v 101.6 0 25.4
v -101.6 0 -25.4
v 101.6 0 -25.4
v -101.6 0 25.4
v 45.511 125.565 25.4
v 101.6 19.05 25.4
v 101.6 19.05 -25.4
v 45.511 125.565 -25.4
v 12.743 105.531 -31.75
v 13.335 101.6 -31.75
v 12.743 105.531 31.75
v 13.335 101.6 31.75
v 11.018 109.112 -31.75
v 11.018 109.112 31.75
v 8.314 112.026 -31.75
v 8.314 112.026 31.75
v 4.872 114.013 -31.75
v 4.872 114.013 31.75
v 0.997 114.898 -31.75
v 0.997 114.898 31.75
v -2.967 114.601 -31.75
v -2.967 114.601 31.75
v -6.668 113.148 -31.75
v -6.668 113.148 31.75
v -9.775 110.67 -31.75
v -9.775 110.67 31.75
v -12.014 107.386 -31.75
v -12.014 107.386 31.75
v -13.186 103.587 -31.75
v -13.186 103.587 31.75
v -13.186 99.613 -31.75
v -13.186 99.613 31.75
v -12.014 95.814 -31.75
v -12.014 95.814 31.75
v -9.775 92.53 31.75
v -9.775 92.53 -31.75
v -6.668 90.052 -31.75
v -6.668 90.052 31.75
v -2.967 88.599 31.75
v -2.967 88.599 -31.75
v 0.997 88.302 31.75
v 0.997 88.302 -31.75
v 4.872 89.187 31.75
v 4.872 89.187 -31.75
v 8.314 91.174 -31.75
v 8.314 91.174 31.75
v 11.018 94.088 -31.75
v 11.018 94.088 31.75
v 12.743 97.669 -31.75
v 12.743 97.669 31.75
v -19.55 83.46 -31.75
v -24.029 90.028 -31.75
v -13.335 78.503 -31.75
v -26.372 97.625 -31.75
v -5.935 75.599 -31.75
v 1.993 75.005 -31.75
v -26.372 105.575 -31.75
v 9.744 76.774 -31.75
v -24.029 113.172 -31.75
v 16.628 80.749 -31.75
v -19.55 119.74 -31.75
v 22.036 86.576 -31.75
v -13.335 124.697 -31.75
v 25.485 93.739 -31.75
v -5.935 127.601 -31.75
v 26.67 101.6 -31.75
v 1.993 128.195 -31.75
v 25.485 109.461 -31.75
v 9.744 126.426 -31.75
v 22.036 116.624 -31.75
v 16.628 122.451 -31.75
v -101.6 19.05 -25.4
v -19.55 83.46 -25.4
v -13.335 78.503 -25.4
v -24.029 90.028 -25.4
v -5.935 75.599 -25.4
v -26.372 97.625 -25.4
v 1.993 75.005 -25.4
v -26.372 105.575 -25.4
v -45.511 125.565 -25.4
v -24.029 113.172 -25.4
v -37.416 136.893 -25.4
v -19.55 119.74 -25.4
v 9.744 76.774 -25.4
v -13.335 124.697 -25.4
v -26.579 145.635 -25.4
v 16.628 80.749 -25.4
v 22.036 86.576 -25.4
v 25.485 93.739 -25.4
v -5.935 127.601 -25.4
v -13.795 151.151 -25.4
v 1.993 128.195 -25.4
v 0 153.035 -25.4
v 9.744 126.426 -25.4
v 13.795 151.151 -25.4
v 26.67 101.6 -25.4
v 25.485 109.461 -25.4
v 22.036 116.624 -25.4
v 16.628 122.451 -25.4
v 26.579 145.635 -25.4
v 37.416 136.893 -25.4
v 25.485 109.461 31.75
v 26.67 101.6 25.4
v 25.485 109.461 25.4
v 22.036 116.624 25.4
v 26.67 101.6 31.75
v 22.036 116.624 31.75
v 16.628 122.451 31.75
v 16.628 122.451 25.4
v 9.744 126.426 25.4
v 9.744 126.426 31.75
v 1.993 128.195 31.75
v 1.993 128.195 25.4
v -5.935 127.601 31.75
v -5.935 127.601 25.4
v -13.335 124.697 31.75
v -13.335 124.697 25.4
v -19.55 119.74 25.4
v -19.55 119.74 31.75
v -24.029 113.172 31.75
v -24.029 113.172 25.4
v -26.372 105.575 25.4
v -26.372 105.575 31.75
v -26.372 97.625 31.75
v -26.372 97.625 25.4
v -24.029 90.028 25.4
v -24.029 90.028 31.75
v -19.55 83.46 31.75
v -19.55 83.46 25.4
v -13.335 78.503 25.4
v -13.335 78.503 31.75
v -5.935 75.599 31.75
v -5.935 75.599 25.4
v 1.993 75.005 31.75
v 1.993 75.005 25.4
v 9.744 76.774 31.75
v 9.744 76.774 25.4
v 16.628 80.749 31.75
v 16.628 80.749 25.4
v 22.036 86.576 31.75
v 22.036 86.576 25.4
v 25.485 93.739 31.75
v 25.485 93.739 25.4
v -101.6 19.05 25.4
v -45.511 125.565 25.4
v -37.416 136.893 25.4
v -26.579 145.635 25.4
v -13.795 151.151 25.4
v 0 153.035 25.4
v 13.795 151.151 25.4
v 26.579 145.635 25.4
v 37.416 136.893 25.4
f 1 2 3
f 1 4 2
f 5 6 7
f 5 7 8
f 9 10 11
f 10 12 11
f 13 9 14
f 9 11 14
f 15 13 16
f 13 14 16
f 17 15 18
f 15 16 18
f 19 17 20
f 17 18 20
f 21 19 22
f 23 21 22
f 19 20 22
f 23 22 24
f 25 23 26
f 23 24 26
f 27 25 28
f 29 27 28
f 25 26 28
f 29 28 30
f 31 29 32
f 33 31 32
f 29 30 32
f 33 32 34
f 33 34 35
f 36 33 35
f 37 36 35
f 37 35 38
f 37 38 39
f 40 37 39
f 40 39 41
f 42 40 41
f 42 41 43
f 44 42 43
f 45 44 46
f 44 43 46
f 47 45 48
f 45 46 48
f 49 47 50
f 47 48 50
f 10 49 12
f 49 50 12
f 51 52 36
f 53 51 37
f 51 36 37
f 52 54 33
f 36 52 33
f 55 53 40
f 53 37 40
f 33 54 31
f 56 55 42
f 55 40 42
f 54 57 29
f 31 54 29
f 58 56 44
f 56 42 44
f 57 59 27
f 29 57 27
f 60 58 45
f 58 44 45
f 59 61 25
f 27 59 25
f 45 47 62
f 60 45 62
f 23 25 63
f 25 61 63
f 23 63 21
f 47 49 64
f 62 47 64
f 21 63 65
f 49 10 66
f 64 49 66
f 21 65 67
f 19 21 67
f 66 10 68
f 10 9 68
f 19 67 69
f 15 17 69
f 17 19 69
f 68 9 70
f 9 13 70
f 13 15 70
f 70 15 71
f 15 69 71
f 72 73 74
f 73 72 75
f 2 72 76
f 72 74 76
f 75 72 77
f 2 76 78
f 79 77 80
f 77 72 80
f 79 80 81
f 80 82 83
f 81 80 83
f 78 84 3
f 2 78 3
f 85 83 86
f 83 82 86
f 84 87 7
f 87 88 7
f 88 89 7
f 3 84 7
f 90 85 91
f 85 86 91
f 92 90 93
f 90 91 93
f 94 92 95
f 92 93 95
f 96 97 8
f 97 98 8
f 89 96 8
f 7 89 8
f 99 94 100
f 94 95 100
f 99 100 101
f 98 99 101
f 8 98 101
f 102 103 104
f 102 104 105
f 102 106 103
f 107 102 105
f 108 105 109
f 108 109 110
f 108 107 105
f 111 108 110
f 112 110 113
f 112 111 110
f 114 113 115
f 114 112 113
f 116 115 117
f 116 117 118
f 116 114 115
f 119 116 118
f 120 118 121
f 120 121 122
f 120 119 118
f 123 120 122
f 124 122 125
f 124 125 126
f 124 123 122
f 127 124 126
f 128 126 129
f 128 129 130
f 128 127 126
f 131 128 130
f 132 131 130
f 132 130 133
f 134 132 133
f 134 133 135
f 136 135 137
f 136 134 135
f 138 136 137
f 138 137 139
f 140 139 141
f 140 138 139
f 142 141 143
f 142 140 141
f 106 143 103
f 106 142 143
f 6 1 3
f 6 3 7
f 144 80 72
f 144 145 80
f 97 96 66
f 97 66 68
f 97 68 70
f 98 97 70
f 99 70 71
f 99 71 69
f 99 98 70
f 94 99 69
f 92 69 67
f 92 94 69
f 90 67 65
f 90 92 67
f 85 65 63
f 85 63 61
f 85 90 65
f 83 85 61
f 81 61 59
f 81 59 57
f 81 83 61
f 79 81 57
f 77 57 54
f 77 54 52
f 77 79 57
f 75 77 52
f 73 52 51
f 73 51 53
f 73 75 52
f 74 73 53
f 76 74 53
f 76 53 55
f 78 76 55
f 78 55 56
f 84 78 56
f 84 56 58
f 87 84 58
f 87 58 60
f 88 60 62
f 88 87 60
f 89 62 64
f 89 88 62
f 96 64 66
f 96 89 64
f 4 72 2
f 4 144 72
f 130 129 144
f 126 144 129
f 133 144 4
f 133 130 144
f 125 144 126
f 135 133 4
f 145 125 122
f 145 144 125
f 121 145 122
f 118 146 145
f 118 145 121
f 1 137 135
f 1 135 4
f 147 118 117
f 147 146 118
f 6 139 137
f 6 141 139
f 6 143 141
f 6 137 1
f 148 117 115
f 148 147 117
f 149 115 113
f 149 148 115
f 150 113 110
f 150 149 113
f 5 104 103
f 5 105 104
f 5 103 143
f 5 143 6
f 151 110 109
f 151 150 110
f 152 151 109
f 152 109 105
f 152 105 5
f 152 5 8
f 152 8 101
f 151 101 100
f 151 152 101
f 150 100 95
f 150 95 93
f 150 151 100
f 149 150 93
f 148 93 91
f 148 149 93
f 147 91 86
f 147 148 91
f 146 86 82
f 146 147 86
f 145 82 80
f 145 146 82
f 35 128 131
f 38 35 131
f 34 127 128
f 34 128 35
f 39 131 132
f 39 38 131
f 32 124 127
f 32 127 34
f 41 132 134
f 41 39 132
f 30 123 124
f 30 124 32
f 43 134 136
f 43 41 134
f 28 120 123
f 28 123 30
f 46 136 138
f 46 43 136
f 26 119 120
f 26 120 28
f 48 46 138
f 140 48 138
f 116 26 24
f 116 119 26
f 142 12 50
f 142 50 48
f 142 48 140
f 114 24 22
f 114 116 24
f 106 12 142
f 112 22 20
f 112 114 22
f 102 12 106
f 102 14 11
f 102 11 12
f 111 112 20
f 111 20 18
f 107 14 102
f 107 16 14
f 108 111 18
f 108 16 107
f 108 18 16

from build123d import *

# Parameters (mm, degrees)
SKETCH1_R               = 13.335
BOSS_EXTRUDE1_DEPTH     = 25.4
SKETCH7_R               = 26.67
BOSS_EXTRUDE3_DEPTH     = 31.75
SKETCH10_R              = 13.335
CUT_EXTRUDE1_DEPTH      = 32.75
CUT_EXTRUDE1_DEPTH_BACK = 32.75


with BuildPart() as part:
    # Sketch1 → Boss-Extrude1 (new body, symmetric)
    with BuildSketch(Plane.XY):
        with BuildLine():
            Line((-101.6, 0), (101.6, 0))
            Line((101.6, 0), (101.6, 19.05))
            Line((101.6, 19.05), (45.510728203, 125.565242403))
            ThreePointArc((45.510728203, 125.565242403), (0, 153.035), (-45.510728203, 125.565242403))
            Line((-45.510728203, 125.565242403), (-101.6, 19.05))
            Line((-101.6, 19.05), (-101.6, 0))
        make_face()
        with Locations((0, 101.6)):
            Circle(SKETCH1_R, mode=Mode.SUBTRACT)
    extrude(amount=BOSS_EXTRUDE1_DEPTH, both=True)

    # Sketch7 → Boss-Extrude3 (add, symmetric)
    with BuildSketch(Plane.XY):
        with Locations((0, 101.6)):
            Circle(SKETCH7_R)
    extrude(amount=BOSS_EXTRUDE3_DEPTH, both=True)

    # Sketch10 → Cut-Extrude1 (cut, two sides)
    with BuildSketch(Plane.XY) as cut_extrude1_sk:
        with Locations((0, 101.6)):
            Circle(SKETCH10_R)
    extrude(amount=CUT_EXTRUDE1_DEPTH, mode=Mode.SUBTRACT)
    extrude(cut_extrude1_sk.sketch, amount=-CUT_EXTRUDE1_DEPTH_BACK, mode=Mode.SUBTRACT)


solid = part.part
